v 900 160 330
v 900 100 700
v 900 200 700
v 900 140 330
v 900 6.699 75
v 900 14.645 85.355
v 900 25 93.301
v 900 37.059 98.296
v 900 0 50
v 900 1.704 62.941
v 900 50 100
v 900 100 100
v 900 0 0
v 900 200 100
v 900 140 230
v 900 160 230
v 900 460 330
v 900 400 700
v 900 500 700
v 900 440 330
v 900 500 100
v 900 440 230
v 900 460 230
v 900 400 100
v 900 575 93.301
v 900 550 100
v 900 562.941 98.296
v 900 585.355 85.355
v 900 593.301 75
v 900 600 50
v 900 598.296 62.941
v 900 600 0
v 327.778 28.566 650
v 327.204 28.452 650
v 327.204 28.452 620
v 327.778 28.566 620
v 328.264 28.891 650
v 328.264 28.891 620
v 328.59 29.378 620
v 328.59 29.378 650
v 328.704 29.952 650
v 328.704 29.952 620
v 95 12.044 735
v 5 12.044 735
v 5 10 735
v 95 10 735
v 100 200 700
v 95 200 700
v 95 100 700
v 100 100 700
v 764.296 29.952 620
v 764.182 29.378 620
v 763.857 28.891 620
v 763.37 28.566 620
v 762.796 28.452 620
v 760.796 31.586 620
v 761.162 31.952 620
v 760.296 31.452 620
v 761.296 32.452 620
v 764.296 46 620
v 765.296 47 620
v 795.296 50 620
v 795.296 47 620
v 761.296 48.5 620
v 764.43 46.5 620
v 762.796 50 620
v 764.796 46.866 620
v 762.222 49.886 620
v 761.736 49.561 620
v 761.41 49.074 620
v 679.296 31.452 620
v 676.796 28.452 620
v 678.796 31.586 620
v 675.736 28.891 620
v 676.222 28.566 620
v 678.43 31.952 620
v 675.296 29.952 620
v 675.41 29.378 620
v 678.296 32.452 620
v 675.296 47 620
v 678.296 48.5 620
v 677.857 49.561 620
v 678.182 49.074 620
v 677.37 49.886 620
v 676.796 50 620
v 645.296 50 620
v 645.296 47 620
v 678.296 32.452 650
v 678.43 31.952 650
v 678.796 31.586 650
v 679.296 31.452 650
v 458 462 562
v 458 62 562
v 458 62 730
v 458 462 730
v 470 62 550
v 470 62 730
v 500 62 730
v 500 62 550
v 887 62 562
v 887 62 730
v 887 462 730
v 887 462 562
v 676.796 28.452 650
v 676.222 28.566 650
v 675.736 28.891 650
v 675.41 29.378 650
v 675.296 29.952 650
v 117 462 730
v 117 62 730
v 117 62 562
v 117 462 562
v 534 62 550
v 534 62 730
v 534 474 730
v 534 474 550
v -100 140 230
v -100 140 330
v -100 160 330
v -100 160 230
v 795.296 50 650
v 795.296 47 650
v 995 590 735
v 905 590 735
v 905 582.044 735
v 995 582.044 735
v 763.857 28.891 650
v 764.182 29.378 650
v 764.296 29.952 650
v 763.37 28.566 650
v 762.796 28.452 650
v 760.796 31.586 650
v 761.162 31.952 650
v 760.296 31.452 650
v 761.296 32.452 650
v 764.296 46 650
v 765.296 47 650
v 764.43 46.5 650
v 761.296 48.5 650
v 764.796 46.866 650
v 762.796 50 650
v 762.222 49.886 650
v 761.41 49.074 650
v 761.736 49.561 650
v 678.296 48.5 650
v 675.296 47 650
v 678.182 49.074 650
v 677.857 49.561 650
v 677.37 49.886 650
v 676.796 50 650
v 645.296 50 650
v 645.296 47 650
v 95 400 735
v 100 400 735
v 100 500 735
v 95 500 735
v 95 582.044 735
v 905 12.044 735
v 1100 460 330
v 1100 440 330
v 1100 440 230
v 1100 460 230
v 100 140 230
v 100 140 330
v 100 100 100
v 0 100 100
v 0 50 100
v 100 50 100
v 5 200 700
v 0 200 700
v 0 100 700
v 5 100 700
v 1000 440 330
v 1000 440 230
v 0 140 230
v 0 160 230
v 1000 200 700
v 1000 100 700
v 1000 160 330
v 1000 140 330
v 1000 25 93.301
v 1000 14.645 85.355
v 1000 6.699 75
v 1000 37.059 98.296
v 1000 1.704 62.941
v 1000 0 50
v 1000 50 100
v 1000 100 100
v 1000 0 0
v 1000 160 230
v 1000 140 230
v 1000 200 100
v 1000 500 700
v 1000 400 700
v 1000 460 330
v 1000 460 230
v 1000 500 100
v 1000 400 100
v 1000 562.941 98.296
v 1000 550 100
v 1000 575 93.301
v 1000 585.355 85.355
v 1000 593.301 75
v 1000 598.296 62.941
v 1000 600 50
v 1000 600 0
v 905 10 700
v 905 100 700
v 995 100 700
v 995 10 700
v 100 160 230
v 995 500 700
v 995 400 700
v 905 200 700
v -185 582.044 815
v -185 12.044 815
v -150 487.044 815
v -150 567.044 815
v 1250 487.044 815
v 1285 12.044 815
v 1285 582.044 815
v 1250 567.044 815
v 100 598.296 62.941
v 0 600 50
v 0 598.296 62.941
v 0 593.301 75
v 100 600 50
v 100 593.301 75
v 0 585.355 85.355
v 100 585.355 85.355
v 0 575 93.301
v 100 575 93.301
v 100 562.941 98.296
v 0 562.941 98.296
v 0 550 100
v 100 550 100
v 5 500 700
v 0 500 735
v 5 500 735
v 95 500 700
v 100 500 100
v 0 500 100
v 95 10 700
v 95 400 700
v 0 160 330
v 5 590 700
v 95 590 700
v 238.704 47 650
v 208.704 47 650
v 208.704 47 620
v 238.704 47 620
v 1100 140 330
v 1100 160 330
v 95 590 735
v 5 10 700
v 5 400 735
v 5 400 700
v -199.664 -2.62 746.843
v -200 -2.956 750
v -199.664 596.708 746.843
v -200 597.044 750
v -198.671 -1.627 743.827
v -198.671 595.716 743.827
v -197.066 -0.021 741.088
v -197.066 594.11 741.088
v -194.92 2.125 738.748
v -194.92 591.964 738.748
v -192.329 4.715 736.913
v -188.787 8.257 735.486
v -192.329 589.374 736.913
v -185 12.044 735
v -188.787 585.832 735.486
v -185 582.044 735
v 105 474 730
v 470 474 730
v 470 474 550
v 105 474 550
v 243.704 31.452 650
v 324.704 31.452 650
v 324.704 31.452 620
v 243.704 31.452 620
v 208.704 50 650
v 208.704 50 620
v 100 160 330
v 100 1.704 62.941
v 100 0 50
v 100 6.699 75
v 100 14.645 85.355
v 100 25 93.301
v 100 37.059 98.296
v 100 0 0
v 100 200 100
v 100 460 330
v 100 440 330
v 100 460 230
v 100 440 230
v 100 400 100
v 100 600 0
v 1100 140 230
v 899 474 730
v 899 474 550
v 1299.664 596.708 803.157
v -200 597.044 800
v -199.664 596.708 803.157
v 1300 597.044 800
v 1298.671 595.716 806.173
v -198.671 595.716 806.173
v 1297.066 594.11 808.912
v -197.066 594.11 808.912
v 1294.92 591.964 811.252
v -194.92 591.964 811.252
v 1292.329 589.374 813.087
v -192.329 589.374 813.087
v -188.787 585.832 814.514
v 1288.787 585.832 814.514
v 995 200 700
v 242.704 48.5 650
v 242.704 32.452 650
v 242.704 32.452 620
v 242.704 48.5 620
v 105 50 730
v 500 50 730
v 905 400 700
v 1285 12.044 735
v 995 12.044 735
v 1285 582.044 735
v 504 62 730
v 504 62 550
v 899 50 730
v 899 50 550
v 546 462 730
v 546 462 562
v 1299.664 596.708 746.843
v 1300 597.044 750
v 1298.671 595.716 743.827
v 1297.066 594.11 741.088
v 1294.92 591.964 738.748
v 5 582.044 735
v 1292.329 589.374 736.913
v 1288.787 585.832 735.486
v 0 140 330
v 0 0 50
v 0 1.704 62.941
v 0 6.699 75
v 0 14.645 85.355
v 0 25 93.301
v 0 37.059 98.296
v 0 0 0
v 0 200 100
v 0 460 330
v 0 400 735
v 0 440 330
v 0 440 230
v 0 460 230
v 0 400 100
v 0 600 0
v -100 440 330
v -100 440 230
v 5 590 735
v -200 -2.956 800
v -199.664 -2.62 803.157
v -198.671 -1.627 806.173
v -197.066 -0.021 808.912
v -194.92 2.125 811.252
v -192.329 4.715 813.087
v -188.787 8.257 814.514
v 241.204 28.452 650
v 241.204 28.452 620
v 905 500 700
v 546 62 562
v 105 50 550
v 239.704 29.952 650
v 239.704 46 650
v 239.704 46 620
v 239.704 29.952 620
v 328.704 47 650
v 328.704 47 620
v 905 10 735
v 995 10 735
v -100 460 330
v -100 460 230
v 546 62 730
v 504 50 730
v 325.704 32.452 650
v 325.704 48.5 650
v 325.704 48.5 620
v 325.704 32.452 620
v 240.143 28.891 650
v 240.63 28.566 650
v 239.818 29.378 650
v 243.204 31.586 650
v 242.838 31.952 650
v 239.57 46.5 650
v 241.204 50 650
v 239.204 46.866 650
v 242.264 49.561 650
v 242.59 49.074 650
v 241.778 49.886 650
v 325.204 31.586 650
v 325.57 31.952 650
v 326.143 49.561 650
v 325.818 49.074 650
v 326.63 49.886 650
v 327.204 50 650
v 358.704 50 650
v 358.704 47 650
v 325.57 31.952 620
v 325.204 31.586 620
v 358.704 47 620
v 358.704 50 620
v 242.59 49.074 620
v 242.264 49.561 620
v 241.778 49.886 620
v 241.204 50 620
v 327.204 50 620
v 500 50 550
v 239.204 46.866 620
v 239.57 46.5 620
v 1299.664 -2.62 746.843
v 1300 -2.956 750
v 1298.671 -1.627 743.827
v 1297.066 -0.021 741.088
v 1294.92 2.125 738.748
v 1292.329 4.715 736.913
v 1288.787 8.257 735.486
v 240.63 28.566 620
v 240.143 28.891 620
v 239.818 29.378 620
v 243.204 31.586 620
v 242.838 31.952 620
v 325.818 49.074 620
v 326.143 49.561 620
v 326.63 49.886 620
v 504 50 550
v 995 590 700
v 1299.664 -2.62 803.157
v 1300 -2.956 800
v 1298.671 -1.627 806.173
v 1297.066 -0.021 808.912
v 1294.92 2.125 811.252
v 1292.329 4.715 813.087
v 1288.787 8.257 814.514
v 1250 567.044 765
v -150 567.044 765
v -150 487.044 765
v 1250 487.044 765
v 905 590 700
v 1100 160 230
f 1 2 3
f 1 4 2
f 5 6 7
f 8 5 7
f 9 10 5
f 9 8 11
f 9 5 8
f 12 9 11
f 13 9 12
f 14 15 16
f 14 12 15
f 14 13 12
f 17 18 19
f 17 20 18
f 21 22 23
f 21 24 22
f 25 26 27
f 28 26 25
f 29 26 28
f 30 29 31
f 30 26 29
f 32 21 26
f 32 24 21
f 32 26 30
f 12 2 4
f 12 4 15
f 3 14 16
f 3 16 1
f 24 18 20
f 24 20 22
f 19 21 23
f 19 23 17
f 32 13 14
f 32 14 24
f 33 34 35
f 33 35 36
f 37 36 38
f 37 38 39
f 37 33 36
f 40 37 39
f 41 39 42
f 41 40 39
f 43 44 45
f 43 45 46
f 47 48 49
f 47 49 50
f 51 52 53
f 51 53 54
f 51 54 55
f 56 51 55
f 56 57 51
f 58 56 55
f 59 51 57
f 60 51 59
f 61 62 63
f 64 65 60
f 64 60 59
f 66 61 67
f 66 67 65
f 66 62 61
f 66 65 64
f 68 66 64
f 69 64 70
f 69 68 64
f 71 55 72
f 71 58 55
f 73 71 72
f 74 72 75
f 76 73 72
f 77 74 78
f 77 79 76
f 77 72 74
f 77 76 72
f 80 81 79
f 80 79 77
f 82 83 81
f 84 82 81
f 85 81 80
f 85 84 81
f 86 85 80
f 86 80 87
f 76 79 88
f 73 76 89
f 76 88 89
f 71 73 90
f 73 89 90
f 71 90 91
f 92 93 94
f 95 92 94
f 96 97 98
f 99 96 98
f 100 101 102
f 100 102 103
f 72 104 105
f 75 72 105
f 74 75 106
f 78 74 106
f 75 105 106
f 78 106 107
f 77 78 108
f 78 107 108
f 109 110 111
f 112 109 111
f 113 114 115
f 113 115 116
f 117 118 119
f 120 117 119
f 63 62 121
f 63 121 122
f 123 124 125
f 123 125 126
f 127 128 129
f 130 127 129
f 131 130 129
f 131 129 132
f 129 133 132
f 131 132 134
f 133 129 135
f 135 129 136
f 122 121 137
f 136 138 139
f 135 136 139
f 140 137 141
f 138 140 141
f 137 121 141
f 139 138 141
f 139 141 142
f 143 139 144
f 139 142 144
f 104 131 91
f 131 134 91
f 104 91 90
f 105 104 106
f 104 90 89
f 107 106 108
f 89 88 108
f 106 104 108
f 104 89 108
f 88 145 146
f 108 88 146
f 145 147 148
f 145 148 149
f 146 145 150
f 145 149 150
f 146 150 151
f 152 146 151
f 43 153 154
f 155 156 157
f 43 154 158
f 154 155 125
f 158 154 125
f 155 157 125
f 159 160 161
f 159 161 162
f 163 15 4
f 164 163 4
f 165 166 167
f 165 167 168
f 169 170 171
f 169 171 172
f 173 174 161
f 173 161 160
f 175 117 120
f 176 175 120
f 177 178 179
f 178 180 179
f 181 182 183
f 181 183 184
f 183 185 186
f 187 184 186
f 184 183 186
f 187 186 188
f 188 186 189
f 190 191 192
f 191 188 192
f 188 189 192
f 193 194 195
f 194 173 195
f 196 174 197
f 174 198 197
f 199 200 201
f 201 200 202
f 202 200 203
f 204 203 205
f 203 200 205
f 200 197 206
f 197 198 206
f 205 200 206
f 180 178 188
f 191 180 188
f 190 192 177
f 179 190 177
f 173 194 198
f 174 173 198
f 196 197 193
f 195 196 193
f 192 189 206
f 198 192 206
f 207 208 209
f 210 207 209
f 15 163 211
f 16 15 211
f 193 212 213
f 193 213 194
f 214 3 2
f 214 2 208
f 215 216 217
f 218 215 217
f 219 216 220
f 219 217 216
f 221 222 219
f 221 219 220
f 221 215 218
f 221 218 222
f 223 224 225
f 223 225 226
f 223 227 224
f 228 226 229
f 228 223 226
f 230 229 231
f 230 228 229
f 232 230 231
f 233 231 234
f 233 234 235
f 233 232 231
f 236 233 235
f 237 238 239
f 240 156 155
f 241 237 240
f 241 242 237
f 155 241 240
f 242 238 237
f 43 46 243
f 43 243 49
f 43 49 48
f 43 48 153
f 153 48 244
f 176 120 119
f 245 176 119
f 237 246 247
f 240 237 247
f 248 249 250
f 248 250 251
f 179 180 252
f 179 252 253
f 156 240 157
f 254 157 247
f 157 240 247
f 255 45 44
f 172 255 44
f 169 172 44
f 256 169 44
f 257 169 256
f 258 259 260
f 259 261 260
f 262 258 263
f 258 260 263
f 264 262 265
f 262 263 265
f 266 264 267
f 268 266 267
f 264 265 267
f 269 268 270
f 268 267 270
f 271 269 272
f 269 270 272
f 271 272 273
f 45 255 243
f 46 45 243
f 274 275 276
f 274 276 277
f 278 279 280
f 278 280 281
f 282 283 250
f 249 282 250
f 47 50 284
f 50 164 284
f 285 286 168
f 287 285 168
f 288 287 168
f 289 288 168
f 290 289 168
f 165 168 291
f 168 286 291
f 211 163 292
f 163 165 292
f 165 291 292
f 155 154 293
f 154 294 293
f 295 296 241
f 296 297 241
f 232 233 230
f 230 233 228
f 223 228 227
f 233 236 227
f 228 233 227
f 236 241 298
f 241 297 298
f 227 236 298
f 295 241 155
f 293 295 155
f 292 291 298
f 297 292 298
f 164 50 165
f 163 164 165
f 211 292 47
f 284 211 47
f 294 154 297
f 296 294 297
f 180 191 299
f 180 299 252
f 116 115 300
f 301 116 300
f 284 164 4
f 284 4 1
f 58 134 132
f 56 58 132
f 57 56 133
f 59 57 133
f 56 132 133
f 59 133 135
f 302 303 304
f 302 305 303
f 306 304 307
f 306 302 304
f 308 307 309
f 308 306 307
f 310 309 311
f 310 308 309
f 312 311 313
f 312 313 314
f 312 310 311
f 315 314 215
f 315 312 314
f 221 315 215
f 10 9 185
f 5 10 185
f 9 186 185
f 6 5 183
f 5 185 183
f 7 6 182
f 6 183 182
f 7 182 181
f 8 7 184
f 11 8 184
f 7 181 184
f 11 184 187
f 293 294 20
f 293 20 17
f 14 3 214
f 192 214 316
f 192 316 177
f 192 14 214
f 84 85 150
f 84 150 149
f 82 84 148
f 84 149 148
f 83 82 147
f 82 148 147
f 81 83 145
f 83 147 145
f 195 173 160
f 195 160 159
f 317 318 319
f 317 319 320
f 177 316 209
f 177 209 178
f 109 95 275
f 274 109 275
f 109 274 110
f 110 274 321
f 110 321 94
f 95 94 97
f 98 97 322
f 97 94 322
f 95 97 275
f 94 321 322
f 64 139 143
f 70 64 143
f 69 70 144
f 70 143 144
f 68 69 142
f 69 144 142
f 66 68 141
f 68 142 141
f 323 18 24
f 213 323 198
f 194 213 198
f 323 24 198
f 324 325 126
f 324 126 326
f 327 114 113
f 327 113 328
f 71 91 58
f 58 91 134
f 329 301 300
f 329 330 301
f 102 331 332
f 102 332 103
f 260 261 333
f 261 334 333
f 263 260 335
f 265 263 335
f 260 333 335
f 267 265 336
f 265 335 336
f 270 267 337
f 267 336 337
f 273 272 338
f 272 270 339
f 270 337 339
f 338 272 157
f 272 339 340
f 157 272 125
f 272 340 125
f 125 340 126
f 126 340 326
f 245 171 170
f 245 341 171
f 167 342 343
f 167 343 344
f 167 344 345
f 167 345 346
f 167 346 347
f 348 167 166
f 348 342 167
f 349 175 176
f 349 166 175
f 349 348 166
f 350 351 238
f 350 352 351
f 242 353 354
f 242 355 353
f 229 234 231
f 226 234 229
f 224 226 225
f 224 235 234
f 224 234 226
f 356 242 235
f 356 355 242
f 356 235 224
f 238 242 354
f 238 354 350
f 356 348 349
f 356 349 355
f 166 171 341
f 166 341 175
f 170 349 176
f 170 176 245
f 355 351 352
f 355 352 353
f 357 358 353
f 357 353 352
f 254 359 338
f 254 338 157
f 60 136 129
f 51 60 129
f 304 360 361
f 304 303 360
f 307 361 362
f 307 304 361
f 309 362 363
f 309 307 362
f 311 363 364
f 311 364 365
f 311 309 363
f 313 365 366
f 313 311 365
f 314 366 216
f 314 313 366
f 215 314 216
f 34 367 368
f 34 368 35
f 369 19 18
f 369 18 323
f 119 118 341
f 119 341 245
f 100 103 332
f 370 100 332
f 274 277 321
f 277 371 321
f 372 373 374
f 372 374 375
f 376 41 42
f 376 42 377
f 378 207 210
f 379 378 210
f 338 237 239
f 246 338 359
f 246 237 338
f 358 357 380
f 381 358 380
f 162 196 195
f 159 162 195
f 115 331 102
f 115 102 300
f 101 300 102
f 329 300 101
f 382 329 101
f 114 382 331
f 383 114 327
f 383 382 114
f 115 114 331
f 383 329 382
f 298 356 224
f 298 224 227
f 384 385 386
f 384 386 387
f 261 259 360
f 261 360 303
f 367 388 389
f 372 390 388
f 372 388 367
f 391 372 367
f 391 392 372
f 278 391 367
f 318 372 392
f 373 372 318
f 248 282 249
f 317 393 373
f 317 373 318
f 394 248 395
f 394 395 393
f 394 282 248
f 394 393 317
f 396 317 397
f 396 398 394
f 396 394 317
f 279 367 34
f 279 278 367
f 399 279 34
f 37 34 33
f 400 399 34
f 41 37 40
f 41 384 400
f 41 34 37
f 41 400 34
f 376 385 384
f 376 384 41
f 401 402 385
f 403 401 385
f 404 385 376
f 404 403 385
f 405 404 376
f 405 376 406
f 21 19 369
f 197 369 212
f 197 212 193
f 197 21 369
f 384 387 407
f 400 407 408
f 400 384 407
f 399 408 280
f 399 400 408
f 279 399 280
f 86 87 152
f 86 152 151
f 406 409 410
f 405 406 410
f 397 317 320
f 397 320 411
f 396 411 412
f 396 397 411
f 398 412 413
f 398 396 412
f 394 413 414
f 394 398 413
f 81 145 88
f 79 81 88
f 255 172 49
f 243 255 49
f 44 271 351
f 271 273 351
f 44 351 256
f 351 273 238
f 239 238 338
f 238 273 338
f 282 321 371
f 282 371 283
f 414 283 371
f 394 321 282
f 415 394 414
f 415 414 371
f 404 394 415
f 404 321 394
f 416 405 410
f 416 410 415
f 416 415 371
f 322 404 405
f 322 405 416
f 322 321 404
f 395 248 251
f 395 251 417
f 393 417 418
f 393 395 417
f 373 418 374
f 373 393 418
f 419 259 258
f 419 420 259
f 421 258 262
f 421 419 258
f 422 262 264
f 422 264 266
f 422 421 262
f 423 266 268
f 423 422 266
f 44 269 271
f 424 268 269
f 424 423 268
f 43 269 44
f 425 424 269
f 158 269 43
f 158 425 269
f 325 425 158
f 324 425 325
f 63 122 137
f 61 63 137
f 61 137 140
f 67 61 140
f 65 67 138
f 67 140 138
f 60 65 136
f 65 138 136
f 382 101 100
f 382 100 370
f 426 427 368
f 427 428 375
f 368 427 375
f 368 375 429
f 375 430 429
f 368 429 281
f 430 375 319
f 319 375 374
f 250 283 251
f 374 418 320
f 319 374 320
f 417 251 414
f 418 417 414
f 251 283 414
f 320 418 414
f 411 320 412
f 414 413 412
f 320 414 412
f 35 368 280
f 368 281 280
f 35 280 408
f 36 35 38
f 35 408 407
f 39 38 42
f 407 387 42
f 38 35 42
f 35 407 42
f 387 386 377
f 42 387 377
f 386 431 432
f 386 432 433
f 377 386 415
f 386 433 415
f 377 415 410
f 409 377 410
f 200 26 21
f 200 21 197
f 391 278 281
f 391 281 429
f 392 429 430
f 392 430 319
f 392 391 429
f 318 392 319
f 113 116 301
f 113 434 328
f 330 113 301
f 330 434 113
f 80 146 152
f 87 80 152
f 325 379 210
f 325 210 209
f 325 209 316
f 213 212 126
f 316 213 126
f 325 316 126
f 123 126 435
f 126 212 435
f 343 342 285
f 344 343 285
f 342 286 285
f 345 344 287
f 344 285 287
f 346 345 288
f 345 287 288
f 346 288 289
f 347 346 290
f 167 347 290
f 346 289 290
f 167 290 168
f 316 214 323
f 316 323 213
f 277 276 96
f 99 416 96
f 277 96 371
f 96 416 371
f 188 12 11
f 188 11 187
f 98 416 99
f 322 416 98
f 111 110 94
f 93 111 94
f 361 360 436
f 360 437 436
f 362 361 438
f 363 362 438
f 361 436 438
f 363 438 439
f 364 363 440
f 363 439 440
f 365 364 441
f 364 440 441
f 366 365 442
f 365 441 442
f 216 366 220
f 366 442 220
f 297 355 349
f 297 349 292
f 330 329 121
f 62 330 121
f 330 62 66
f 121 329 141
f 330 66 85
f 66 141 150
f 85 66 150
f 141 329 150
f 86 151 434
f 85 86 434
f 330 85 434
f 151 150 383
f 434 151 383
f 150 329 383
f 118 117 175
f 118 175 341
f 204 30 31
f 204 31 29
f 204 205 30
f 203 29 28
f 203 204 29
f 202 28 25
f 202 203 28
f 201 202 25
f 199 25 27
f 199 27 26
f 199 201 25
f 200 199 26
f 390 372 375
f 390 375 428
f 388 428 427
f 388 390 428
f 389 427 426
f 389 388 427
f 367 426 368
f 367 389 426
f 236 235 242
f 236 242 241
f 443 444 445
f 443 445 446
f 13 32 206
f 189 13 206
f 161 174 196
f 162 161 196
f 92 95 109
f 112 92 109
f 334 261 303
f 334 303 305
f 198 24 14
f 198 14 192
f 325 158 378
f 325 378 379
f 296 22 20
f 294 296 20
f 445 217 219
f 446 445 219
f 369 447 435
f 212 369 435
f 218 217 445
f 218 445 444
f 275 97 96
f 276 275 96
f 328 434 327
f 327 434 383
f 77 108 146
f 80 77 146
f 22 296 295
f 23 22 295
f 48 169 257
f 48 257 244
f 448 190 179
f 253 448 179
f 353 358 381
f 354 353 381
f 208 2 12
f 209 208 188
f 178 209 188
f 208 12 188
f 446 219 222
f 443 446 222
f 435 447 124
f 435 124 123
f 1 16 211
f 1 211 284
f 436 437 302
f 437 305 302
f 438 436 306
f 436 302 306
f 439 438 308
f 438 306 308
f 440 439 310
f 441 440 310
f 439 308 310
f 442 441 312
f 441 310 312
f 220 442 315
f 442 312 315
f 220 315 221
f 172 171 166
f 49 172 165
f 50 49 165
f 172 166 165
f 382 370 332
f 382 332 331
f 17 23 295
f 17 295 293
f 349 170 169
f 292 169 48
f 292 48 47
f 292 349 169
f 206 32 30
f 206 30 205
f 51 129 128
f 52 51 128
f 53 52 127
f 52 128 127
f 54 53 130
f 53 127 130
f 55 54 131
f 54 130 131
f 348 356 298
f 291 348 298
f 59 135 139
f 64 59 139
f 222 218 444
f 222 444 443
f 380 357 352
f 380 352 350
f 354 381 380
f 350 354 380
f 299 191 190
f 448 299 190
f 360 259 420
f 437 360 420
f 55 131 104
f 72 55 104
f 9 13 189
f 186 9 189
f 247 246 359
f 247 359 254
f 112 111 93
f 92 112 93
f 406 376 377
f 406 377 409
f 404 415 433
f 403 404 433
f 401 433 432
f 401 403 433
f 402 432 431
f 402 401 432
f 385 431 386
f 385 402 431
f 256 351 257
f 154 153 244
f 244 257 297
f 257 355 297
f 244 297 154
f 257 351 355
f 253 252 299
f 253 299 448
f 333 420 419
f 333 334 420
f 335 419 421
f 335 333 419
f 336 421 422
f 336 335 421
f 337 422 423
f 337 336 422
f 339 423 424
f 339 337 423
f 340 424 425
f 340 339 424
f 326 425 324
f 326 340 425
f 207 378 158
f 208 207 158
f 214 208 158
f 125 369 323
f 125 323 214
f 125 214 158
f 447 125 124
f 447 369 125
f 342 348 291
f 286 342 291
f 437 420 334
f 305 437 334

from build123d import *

# Parameters (mm, degrees)
F0_W      = 100
F0_H      = 600
F1_DEPTH  = 100
F2_W      = 100
F2_H      = 100
F3_DEPTH  = 600
F5_W      = 20
F5_H      = 100
F6_DEPTH  = 1200
F7_R      = 50
F7_2_R    = 50
F8_W      = 90
F8_H      = 580
F9_DEPTH  = 35
F8_H_2    = 90
F8_W_2    = 5
F8_H_3    = 100
F8_H_4    = 390
F10_W     = 1500
F10_H     = 600
F10_W_2   = 90
F10_H_2   = 580
F11_DEPTH = 80
F12_R     = 15
F14_W     = 1400
F14_H     = 80
F15_DEPTH = 50
F17_W     = 395
F17_H     = 180
F18_DEPTH = 12
F20_DEPTH = 400
F21_W     = 341
F21_H     = 168
F22_DEPTH = 12
F25_DEPTH = 30


with BuildPart() as f1:
    # F0 (on Top) → F1 (new body)
    with BuildSketch(Plane.XY):
        with Locations((50, 300)):
            Rectangle(F0_W, F0_H)
    extrude(amount=F1_DEPTH)

    # F7
    f7_edges = [f1.edges().sort_by_distance(p)[0] for p in [
        (50, 600, 100),
        (50, 0, 100),
    ]]
    fillet(f7_edges, radius=F7_R)


with BuildPart() as f1b:
    # F0 (on Top) → F1, piece 2 (new body)
    with BuildSketch(Plane.XY):
        with Locations((950, 300)):
            Rectangle(F0_W, F0_H)
    extrude(amount=F1_DEPTH)

    # F7#2
    f7_2_edges = [f1b.edges().sort_by_distance(p)[0] for p in [
        (950, 0, 100),
        (950, 600, 100),
    ]]
    fillet(f7_2_edges, radius=F7_2_R)


with BuildPart() as f3:
    # F2 (on face) → F3 (new body)
    with BuildSketch(Plane.XY.offset(100)):
        with Locations((50, 450)):
            Rectangle(F2_W, F2_H)
    extrude(amount=F3_DEPTH)


with BuildPart() as f3b:
    # F2 (on face) → F3, piece 2 (new body)
    with BuildSketch(Plane.XY.offset(100)):
        with Locations((950, 450)):
            Rectangle(F2_W, F2_H)
    extrude(amount=F3_DEPTH)


with BuildPart() as f3c:
    # F2 (on face) → F3, piece 3 (new body)
    with BuildSketch(Plane.XY.offset(100)):
        with Locations((950, 150)):
            Rectangle(F2_W, F2_H)
    extrude(amount=F3_DEPTH)


with BuildPart() as f3d:
    # F2 (on face) → F3, piece 4 (new body)
    with BuildSketch(Plane.XY.offset(100)):
        with Locations((50, 150)):
            Rectangle(F2_W, F2_H)
    extrude(amount=F3_DEPTH)


with BuildPart() as f6:
    # F5 (on offset) → F6 (new body)
    with BuildSketch(Plane.YZ.offset(-100)):
        with Locations((450, 280)):
            Rectangle(F5_W, F5_H)
    extrude(amount=F6_DEPTH)


with BuildPart() as f6b:
    # F5 (on offset) → F6, piece 2 (new body)
    with BuildSketch(Plane.YZ.offset(-100)):
        with Locations((150, 280)):
            Rectangle(F5_W, F5_H)
    extrude(amount=F6_DEPTH)


with BuildPart() as f9:
    # F8 (on face) → F9 (new body)
    with BuildSketch(Plane.XY.offset(700)):
        with Locations((950, 300)):
            Rectangle(F8_W, F8_H)
    extrude(amount=F9_DEPTH)


with BuildPart() as f9b:
    # F8 (on face) → F9, piece 2 (new body)
    with BuildSketch(Plane.XY.offset(700)):
        with Locations((50, 545)):
            Rectangle(F8_W, F8_H_2)
        with Locations((2.5, 450)):
            Rectangle(F8_W_2, F8_H_3)
        with Locations((50, 450)):
            Rectangle(F8_W, F8_H_3)
        with Locations((97.5, 450)):
            Rectangle(F8_W_2, F8_H_3)
        with Locations((50, 205)):
            Rectangle(F8_W, F8_H_4)
    extrude(amount=F9_DEPTH)


with BuildPart() as f11:
    # F10 (on face) → F11 (new body)
    with BuildSketch(Plane.XY.offset(735)):
        with Locations((550, 297.044474259)):
            Rectangle(F10_W, F10_H)
        with Locations((950, 300)):
            Rectangle(F10_W_2, F10_H_2, mode=Mode.SUBTRACT)
        with Locations((950, 300)):
            Rectangle(F10_W_2, F10_H_2)
    extrude(amount=F11_DEPTH)

    # F12
    f12_edges = [f11.edges().sort_by_distance(p)[0] for p in [
        (1300, 297.044474, 815),
        (550, 597.044474, 815),
        (-200, 297.044474, 815),
        (550, -2.955526, 815),
        (1300, 297.044474, 735),
        (550, 597.044474, 735),
        (-200, 297.044474, 735),
        (550, -2.955526, 735),
    ]]
    fillet(f12_edges, radius=F12_R)


with BuildPart() as f1_1:
    add(f1.part)

    # F13: union F1b, F3, F3d, F3c, F3b, F6b, F6, F9b, F9, F11
    add(f1b.part)
    add(f3.part)
    add(f3d.part)
    add(f3c.part)
    add(f3b.part)
    add(f6b.part)
    add(f6.part)
    add(f9b.part)
    add(f9.part)
    add(f11.part)

    # F14 (on face) → F15 (cut)
    with BuildSketch(Plane.XY.offset(815)):
        with Locations((550, 527.044474259)):
            Rectangle(F14_W, F14_H)
    extrude(amount=-F15_DEPTH, mode=Mode.SUBTRACT)


with BuildPart() as f18:
    # F17 (on offset) → F18 (new body)
    with BuildSketch(Plane.XZ.offset(-50)):
        with Locations((302.5, 640)):
            Rectangle(F17_W, F17_H)
    extrude(amount=-F18_DEPTH)

    # F19 (on face) → F20 (join)
    with BuildSketch(Plane(origin=(0, 62, 0), x_dir=(-1, 0, 0), z_dir=(0, 1, 0))):
        Polygon((-458, 730), (-470, 730), (-470, 562), (-470, 550), (-458, 550), (-117, 550), (-105, 550), (-105, 562), (-105, 730), (-117, 730), (-117, 562), (-458, 562), align=None)
    extrude(amount=F20_DEPTH)

    # F21 (on face) → F22 (join)
    with BuildSketch(Plane(origin=(0, 462, 0), x_dir=(-1, 0, 0), z_dir=(0, 1, 0))):
        Polygon((-458, 730), (-470, 730), (-470, 550), (-105, 550), (-105, 730), (-117, 730), (-117, 562), (-458, 562), align=None)
        with Locations((-287.5, 646)):
            Rectangle(F21_W, F21_H)
    extrude(amount=F22_DEPTH)

    # F24 (on offset) → F25 (join)
    with BuildSketch(Plane.XY.offset(650)):
        with BuildLine():
            Line((241.2038033009, 50), (208.7038033009, 50))
            Line((208.7038033009, 50), (208.7038033009, 47))
            Line((208.7038033009, 47), (238.7038033009, 47))
            ThreePointArc((238.7038033009, 47), (239.410910082, 46.7071067812), (239.7038033009, 46))
            Line((239.7038033009, 46), (239.7038033009, 29.9520255708))
            ThreePointArc((239.7038033009, 29.9520255708), (240.1431431291, 28.8913653991), (241.2038033009, 28.4520255708))
            Line((241.2038033009, 28.4520255708), (242.7038033009, 28.4520255708))
            Line((242.7038033009, 28.4520255708), (325.7038033009, 28.4520255708))
            Line((325.7038033009, 28.4520255708), (327.2038033009, 28.4520255708))
            ThreePointArc((327.2038033009, 28.4520255708), (328.2644634726, 28.8913653991), (328.7038033009, 29.9520255708))
            Line((328.7038033009, 29.9520255708), (328.7038033009, 47))
            Line((328.7038033009, 47), (358.7038033009, 47))
            Line((358.7038033009, 47), (358.7038033009, 50))
            Line((358.7038033009, 50), (328.2038033009, 50))
            Line((328.2038033009, 50), (327.2038033009, 50))
            ThreePointArc((327.2038033009, 50), (326.1431431291, 49.5606601718), (325.7038033009, 48.5))
            Line((325.7038033009, 48.5), (325.7038033009, 32.4520255708))
            ThreePointArc((325.7038033009, 32.4520255708), (325.410910082, 31.7449187897), (324.7038033009, 31.4520255708))
            Line((324.7038033009, 31.4520255708), (243.7038033009, 31.4520255708))
            ThreePointArc((243.7038033009, 31.4520255708), (242.9966965197, 31.7449187897), (242.7038033009, 32.4520255708))
            Line((242.7038033009, 32.4520255708), (242.7038033009, 48.5))
            ThreePointArc((242.7038033009, 48.5), (242.2644634726, 49.5606601718), (241.2038033009, 50))
        make_face()
    extrude(amount=-F25_DEPTH)


with BuildPart() as f27_1:
    # F27: instance of F18
    add(f18.part.mirror(Plane(origin=(502, 56, 640), x_dir=(0, 1, 0), z_dir=(1, 0, 0))))


solid = Compound([f1_1.part, f18.part, f27_1.part])
